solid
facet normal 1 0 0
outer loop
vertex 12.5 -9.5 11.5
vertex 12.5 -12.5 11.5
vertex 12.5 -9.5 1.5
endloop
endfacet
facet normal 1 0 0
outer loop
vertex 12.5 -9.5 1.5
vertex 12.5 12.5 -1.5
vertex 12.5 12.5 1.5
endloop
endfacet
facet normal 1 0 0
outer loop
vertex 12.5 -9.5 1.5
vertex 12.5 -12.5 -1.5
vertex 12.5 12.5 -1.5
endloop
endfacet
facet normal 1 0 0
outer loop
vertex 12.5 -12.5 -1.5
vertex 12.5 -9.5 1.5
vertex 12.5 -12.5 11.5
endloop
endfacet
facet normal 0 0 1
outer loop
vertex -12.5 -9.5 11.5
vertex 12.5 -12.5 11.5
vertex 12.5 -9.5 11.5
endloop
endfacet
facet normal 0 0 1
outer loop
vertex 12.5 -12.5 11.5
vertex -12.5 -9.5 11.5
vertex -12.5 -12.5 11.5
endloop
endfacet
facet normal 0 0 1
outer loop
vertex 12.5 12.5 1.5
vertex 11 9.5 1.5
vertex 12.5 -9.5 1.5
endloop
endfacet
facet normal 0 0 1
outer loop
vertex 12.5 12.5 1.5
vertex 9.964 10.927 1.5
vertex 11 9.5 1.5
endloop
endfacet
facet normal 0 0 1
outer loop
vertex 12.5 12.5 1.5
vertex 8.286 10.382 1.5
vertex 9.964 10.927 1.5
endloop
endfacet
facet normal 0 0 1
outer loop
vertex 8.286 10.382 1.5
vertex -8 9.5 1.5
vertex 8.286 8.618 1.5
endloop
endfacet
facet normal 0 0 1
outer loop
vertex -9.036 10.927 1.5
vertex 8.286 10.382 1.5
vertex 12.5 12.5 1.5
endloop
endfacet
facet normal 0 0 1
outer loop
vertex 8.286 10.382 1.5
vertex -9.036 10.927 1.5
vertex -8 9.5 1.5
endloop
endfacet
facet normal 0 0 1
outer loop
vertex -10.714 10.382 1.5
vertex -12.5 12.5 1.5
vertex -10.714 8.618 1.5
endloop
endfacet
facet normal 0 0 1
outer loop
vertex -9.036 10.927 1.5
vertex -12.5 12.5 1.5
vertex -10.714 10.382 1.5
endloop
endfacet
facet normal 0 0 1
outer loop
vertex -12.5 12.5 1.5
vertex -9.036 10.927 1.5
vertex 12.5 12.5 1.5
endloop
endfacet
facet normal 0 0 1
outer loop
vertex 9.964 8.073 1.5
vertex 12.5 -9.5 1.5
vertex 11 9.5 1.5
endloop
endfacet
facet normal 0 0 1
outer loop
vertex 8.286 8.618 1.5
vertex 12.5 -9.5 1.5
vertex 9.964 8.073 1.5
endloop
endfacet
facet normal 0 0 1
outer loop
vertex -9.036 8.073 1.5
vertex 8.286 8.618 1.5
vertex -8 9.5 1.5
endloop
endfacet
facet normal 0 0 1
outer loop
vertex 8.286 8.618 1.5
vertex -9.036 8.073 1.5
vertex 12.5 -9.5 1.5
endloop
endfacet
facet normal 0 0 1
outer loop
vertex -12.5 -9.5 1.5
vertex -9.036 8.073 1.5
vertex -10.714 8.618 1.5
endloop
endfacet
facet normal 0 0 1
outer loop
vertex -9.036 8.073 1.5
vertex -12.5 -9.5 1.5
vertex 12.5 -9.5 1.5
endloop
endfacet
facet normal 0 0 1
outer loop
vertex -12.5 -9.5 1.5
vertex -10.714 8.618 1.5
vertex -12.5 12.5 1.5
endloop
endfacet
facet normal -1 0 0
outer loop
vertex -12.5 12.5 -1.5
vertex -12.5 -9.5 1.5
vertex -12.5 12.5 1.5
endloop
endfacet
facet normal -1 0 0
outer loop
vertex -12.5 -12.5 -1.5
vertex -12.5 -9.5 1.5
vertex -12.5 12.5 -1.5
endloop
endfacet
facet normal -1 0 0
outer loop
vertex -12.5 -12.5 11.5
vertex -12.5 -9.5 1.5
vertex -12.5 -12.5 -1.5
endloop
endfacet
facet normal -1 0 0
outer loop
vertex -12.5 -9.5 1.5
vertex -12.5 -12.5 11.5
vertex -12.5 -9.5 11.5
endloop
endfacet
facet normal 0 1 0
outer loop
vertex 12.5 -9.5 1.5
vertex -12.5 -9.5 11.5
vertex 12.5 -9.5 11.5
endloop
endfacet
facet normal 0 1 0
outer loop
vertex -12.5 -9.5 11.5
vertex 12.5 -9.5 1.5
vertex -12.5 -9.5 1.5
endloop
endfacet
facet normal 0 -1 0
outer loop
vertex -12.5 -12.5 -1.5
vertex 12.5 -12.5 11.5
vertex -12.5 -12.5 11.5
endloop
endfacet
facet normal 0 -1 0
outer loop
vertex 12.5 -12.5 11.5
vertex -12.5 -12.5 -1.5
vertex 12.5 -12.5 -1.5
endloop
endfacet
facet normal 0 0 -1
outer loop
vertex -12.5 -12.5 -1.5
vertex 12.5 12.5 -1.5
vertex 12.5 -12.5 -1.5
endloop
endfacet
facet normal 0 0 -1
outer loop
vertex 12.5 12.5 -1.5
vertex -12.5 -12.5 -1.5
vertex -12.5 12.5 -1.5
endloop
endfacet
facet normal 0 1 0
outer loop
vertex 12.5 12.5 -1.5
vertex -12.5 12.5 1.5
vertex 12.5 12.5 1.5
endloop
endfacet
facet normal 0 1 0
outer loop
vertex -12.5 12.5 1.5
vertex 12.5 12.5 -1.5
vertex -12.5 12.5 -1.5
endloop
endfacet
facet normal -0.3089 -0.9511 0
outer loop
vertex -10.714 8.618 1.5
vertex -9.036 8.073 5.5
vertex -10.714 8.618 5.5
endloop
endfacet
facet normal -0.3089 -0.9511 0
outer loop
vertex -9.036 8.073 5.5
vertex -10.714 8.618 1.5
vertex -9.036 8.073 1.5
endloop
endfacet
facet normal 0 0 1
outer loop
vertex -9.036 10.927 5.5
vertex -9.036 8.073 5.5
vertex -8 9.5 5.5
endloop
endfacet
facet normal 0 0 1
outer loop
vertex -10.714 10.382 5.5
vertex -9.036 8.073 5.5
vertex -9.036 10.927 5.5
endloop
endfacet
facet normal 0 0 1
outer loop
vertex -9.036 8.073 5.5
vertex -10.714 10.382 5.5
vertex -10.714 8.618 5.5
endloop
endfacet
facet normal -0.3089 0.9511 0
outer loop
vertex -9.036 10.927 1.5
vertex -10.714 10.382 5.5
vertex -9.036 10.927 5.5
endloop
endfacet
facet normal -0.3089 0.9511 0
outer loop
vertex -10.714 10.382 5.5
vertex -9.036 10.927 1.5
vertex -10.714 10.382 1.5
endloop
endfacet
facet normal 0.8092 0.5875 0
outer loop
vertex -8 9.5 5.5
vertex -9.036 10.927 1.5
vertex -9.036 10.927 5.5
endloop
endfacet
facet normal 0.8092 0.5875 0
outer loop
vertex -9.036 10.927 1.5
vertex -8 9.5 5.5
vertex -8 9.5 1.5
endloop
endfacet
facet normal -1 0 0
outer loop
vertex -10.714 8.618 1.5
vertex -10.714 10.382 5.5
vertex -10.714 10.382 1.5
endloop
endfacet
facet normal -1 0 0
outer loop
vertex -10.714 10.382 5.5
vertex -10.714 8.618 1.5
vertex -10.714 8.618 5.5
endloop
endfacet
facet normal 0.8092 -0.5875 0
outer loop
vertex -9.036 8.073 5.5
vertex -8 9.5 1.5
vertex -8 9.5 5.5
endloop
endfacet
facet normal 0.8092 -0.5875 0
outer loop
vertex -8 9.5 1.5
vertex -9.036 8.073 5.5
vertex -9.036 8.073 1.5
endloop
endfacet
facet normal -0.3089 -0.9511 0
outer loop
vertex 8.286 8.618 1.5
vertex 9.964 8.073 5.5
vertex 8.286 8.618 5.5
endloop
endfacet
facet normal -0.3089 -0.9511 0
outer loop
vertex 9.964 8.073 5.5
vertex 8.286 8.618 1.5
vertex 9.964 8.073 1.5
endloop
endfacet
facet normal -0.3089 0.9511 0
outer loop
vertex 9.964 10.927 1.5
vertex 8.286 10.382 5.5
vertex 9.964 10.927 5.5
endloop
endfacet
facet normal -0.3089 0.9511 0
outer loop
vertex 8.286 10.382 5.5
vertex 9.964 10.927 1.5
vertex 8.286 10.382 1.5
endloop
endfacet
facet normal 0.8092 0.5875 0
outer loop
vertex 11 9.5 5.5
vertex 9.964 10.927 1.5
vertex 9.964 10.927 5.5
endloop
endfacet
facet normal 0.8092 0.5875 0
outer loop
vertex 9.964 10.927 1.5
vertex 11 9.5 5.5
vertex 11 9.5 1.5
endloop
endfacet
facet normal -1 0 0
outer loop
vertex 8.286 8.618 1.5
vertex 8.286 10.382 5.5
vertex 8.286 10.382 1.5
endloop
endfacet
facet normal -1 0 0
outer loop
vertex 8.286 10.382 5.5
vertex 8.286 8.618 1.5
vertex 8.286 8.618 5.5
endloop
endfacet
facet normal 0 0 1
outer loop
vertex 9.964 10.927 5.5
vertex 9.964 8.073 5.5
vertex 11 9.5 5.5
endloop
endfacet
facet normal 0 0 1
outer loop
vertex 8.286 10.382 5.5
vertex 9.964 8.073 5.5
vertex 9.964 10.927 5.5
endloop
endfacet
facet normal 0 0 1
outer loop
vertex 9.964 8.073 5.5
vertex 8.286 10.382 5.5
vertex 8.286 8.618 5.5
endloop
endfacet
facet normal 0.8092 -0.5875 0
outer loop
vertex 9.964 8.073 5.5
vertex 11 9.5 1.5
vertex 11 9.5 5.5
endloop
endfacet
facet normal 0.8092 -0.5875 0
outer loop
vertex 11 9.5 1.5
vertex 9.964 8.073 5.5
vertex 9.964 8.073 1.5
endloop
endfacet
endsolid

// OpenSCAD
//Replacement hinge for oven part

base_width = 25;
base_depth = 25;
base_thick = 3;

back_height = 10;
back_width = base_width;
back_thick = 3;

post_r = 1.5;
post_h = 5;

union(){
    translate([0,-base_depth/2+back_thick/2,back_height/2 + base_thick/2]){
        cube([back_width, back_thick, back_height], center=true);
    }
    cube([base_width, base_depth, base_thick], center=true);
    translate([post_r*2 - base_width/2, base_depth/2-post_r*2, base_thick]){
        cylinder(h=post_h, r=post_r, center=true);
    }
    translate([base_width/2 - post_r*2, base_depth/2-post_r*2, base_thick]){
        cylinder(h=post_h, r=post_r, center=true);
    }
}
